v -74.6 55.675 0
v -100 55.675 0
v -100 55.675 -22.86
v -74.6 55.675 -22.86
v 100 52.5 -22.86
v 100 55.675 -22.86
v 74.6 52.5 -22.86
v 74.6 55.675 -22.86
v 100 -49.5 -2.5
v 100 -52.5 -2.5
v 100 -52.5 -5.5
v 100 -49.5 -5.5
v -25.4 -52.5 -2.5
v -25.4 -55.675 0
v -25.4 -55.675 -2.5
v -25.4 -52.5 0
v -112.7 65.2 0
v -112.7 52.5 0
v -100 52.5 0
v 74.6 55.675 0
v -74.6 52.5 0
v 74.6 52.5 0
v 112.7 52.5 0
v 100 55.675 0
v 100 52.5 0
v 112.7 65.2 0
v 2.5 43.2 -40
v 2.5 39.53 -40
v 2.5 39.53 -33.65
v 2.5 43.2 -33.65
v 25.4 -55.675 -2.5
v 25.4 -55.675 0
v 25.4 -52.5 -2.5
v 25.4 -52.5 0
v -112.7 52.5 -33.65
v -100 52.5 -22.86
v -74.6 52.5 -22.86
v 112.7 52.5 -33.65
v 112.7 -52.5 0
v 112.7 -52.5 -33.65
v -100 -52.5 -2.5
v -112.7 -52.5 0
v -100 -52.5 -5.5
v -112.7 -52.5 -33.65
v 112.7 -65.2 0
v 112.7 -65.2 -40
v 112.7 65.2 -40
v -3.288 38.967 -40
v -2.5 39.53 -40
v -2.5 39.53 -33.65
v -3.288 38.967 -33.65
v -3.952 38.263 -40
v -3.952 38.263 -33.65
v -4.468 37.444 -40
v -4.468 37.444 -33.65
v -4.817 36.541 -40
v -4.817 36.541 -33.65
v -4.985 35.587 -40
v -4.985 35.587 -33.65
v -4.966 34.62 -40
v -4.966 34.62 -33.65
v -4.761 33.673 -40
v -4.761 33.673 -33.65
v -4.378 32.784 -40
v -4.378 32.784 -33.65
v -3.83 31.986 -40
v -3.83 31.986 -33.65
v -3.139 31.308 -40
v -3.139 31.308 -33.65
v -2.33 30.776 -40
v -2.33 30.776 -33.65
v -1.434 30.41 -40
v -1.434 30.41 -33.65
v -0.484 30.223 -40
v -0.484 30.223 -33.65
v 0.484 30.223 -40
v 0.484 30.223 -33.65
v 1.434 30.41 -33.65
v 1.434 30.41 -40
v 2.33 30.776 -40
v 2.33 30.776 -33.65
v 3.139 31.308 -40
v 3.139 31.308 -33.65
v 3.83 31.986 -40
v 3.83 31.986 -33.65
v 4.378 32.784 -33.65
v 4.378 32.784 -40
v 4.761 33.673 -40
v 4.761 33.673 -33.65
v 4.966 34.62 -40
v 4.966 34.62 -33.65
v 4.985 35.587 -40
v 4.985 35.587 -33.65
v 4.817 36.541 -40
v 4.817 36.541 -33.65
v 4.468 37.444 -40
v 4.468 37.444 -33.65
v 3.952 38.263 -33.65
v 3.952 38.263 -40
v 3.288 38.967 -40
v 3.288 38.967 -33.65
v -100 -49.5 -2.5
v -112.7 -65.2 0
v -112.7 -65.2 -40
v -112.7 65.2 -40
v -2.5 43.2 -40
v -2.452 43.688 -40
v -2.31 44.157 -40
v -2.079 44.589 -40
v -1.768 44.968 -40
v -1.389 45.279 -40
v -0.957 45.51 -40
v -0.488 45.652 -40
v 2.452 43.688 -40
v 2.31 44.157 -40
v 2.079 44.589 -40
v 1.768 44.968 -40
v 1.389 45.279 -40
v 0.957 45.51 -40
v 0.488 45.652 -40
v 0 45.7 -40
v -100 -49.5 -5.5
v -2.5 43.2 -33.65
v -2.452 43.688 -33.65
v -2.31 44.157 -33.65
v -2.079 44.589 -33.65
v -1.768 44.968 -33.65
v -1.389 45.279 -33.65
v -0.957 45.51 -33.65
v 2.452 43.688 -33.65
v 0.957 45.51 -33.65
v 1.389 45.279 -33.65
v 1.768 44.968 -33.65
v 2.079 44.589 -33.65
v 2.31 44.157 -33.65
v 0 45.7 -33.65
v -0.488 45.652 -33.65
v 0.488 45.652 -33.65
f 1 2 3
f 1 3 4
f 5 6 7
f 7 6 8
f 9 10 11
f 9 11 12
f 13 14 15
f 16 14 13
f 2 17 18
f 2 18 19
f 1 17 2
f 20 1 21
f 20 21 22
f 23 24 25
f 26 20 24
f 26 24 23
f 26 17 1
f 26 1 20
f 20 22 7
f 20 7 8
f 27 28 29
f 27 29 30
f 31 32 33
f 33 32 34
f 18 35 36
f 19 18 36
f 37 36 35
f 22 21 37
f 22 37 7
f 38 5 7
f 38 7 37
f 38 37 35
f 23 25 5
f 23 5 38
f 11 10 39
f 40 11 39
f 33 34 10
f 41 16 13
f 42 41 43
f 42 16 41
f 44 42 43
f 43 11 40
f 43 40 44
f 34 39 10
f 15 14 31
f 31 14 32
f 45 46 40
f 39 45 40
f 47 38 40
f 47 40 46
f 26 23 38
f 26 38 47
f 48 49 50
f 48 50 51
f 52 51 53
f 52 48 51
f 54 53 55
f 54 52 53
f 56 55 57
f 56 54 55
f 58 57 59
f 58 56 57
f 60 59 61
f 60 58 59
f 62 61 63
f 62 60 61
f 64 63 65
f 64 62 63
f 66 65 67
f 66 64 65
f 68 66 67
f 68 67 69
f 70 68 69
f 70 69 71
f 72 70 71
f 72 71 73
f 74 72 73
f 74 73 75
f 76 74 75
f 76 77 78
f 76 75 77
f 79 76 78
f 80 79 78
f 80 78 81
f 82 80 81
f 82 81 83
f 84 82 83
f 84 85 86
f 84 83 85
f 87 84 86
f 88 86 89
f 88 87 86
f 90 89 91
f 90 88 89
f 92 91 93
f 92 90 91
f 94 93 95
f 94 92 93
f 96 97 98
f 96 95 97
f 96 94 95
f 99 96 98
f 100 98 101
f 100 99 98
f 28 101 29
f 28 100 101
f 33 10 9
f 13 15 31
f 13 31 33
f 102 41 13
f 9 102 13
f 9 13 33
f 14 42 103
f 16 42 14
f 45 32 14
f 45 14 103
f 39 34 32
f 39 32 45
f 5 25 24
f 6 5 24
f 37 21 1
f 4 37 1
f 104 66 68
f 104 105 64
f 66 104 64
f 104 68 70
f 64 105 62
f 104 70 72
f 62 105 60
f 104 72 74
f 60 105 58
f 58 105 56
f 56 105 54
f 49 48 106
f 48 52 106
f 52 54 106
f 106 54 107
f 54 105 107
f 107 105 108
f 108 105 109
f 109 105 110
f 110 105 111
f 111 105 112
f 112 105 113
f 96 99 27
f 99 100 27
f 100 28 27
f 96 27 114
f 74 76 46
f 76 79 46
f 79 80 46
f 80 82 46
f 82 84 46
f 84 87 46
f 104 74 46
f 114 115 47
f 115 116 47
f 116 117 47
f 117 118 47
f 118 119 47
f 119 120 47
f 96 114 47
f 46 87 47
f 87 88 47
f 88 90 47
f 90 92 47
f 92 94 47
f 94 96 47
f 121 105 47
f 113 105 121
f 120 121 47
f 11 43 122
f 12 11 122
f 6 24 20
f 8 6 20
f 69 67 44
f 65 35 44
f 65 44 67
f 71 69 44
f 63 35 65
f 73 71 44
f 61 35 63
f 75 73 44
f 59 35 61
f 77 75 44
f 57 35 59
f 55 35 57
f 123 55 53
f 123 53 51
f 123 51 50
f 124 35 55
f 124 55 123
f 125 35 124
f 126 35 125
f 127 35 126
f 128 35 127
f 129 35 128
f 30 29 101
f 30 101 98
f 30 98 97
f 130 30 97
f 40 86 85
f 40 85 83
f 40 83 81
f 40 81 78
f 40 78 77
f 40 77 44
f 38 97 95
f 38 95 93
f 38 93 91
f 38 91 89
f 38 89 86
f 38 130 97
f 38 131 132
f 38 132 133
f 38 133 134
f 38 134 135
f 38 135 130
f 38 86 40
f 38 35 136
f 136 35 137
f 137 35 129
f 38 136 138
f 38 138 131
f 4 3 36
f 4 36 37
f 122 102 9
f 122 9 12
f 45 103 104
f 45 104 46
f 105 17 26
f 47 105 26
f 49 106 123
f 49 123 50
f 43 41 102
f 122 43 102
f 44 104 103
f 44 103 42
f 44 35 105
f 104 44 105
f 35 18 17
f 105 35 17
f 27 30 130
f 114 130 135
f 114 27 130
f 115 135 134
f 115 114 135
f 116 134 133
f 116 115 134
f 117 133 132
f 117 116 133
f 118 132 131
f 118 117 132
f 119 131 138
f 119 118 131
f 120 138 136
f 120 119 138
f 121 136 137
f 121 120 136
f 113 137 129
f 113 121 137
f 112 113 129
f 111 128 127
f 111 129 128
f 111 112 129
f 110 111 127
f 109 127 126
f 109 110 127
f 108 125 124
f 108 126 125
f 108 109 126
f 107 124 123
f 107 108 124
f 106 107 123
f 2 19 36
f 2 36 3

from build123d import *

# Parameters (mm, degrees)
SKETCH1_W            = 225.4
SKETCH1_H            = 130.4
SKETCH1_W_2          = 200
SKETCH1_H_2          = 105
EXTRUSION1_DEPTH     = 40
EXTRUSION2_REACH     = 169.793
SKETCH2_W            = 200
SKETCH2_H            = 6.35
EXTRUSION4_DEPTH     = 137.206938149
SKETCH4_W            = 7.5
SKETCH4_H            = 5
EXTRUSION5_DEPTH     = 227.036125431
EXTRUSION6_REACH     = 228.036
SKETCH5_W            = 3
SKETCH5_H            = 3
SKETCH6_W            = 50.8
SKETCH6_H            = 3.175
EXTRUSION7_DEPTH     = 2.5
SKETCH7_W            = 25.4
SKETCH7_H            = 3.175
EXTRUSION8_DEPTH     = 22.86
EXTRUSION9_DEPTH     = 168.793265657
SKETCH20_W           = 12.7
SKETCH20_H           = 105
CUT_EXTRUDE425_DEPTH = 33.65
BOSS_EXTRUDE4_REACH  = 141.323
SKETCH21_W           = 5.0038
SKETCH21_H           = 12.7


with BuildPart() as part:
    # Sketch1 → Extrusion1 (new body)
    with BuildSketch(Plane.XY):
        Rectangle(SKETCH1_W, SKETCH1_H)
        Rectangle(SKETCH1_W_2, SKETCH1_H_2, mode=Mode.SUBTRACT)
    extrude(amount=-EXTRUSION1_DEPTH)

    # Sketch2 → Extrusion2 (add, up to next)
    with BuildSketch(Plane.XZ.offset(-52.5), mode=Mode.PRIVATE) as extrusion2_sk1:
        with Locations((0, -36.825)):
            Rectangle(SKETCH2_W, SKETCH2_H)
    extrusion2_tool1 = extrude(extrusion2_sk1.sketch, amount=EXTRUSION2_REACH, mode=Mode.PRIVATE) - part.part
    add(extrusion2_tool1.solids().sort_by_distance((0, 52.5, -36.825))[0])

    # Sketch3 → Extrusion4 (cut, through all)
    with BuildSketch(Plane(origin=(0, 0, -40), x_dir=(-1, 0, 0), z_dir=(0, 0, -1))):
        with BuildLine():
            Line((2.5, 43.2), (2.5, 39.530127019))
            ThreePointArc((2.5, 39.530127019), (0, 30.2), (-2.5, 39.530127019))
            Line((-2.5, 39.530127019), (-2.5, 43.2))
            ThreePointArc((-2.5, 43.2), (0, 45.7), (2.5, 43.2))
        make_face()
    extrude(amount=-EXTRUSION4_DEPTH, mode=Mode.SUBTRACT)

    # Sketch4 → Extrusion5 (cut, through all)
    with BuildSketch(Plane.ZY.offset(-100)):
        with Locations((-29.9, -50)):
            Rectangle(SKETCH4_W, SKETCH4_H)
    extrude(amount=-EXTRUSION5_DEPTH, mode=Mode.SUBTRACT)

    # Sketch5 → Extrusion6 (add, up to next)
    with BuildSketch(Plane(origin=(-100, 0, 0), x_dir=(0, 0, -1), z_dir=(1, 0, 0)), mode=Mode.PRIVATE) as extrusion6_sk1:
        with Locations((4, -51)):
            Rectangle(SKETCH5_W, SKETCH5_H)
    extrusion6_tool1 = extrude(extrusion6_sk1.sketch, amount=EXTRUSION6_REACH, mode=Mode.PRIVATE) - part.part
    add(extrusion6_tool1.solids().sort_by_distance((-100, -51, -4))[0])

    # Sketch6 → Extrusion7 (cut)
    with BuildSketch(Plane.XY):
        with Locations((0, -54.0875)):
            Rectangle(SKETCH6_W, SKETCH6_H)
    extrude(amount=-EXTRUSION7_DEPTH, mode=Mode.SUBTRACT)

    # Sketch7 → Extrusion8 (cut)
    with BuildSketch(Plane.XY):
        with Locations((-87.3, 54.0875)):
            Rectangle(SKETCH7_W, SKETCH7_H)
    extrusion8 = extrude(amount=-EXTRUSION8_DEPTH, mode=Mode.SUBTRACT)

    # Mirror1: Extrusion8 across plane
    add(extrusion8.mirror(Plane(origin=(0, 0, 0), x_dir=(0, 0, 1), z_dir=(1, 0, 0))), mode=Mode.SUBTRACT)

    # Sketch8 → Extrusion9 (cut, through all)
    with BuildSketch(Plane(origin=(0, -52.5, 0), x_dir=(-1, 0, 0), z_dir=(0, 1, 0))):
        Polygon((0, -33.65), (3.7465, -33.65), (3.7465, -28.6462), (-3.7465, -28.6462), (-3.7465, -33.65), align=None)
    extrude(amount=-EXTRUSION9_DEPTH, mode=Mode.SUBTRACT)

    # Sketch20 → Cut-Extrude425 (cut)
    with BuildSketch(Plane.XY):
        with Locations((-106.35, 0)):
            Rectangle(SKETCH20_W, SKETCH20_H)
        with Locations((106.35, 0)):
            Rectangle(SKETCH20_W, SKETCH20_H)
    extrude(amount=-CUT_EXTRUDE425_DEPTH, mode=Mode.SUBTRACT)

    # Sketch21 → Boss-Extrude4 (add, up to next)
    with BuildSketch(Plane(origin=(-3.7465, 0, 0), x_dir=(0, 0, -1), z_dir=(1, 0, 0)), mode=Mode.PRIVATE) as boss_extrude4_sk1:
        with Locations((31.1481, -58.85)):
            Rectangle(SKETCH21_W, SKETCH21_H)
    boss_extrude4_tool1 = extrude(boss_extrude4_sk1.sketch, amount=BOSS_EXTRUDE4_REACH, mode=Mode.PRIVATE) - part.part
    add(boss_extrude4_tool1.solids().sort_by_distance((-3.7465, -58.85, -31.1481))[0])


solid = part.part
